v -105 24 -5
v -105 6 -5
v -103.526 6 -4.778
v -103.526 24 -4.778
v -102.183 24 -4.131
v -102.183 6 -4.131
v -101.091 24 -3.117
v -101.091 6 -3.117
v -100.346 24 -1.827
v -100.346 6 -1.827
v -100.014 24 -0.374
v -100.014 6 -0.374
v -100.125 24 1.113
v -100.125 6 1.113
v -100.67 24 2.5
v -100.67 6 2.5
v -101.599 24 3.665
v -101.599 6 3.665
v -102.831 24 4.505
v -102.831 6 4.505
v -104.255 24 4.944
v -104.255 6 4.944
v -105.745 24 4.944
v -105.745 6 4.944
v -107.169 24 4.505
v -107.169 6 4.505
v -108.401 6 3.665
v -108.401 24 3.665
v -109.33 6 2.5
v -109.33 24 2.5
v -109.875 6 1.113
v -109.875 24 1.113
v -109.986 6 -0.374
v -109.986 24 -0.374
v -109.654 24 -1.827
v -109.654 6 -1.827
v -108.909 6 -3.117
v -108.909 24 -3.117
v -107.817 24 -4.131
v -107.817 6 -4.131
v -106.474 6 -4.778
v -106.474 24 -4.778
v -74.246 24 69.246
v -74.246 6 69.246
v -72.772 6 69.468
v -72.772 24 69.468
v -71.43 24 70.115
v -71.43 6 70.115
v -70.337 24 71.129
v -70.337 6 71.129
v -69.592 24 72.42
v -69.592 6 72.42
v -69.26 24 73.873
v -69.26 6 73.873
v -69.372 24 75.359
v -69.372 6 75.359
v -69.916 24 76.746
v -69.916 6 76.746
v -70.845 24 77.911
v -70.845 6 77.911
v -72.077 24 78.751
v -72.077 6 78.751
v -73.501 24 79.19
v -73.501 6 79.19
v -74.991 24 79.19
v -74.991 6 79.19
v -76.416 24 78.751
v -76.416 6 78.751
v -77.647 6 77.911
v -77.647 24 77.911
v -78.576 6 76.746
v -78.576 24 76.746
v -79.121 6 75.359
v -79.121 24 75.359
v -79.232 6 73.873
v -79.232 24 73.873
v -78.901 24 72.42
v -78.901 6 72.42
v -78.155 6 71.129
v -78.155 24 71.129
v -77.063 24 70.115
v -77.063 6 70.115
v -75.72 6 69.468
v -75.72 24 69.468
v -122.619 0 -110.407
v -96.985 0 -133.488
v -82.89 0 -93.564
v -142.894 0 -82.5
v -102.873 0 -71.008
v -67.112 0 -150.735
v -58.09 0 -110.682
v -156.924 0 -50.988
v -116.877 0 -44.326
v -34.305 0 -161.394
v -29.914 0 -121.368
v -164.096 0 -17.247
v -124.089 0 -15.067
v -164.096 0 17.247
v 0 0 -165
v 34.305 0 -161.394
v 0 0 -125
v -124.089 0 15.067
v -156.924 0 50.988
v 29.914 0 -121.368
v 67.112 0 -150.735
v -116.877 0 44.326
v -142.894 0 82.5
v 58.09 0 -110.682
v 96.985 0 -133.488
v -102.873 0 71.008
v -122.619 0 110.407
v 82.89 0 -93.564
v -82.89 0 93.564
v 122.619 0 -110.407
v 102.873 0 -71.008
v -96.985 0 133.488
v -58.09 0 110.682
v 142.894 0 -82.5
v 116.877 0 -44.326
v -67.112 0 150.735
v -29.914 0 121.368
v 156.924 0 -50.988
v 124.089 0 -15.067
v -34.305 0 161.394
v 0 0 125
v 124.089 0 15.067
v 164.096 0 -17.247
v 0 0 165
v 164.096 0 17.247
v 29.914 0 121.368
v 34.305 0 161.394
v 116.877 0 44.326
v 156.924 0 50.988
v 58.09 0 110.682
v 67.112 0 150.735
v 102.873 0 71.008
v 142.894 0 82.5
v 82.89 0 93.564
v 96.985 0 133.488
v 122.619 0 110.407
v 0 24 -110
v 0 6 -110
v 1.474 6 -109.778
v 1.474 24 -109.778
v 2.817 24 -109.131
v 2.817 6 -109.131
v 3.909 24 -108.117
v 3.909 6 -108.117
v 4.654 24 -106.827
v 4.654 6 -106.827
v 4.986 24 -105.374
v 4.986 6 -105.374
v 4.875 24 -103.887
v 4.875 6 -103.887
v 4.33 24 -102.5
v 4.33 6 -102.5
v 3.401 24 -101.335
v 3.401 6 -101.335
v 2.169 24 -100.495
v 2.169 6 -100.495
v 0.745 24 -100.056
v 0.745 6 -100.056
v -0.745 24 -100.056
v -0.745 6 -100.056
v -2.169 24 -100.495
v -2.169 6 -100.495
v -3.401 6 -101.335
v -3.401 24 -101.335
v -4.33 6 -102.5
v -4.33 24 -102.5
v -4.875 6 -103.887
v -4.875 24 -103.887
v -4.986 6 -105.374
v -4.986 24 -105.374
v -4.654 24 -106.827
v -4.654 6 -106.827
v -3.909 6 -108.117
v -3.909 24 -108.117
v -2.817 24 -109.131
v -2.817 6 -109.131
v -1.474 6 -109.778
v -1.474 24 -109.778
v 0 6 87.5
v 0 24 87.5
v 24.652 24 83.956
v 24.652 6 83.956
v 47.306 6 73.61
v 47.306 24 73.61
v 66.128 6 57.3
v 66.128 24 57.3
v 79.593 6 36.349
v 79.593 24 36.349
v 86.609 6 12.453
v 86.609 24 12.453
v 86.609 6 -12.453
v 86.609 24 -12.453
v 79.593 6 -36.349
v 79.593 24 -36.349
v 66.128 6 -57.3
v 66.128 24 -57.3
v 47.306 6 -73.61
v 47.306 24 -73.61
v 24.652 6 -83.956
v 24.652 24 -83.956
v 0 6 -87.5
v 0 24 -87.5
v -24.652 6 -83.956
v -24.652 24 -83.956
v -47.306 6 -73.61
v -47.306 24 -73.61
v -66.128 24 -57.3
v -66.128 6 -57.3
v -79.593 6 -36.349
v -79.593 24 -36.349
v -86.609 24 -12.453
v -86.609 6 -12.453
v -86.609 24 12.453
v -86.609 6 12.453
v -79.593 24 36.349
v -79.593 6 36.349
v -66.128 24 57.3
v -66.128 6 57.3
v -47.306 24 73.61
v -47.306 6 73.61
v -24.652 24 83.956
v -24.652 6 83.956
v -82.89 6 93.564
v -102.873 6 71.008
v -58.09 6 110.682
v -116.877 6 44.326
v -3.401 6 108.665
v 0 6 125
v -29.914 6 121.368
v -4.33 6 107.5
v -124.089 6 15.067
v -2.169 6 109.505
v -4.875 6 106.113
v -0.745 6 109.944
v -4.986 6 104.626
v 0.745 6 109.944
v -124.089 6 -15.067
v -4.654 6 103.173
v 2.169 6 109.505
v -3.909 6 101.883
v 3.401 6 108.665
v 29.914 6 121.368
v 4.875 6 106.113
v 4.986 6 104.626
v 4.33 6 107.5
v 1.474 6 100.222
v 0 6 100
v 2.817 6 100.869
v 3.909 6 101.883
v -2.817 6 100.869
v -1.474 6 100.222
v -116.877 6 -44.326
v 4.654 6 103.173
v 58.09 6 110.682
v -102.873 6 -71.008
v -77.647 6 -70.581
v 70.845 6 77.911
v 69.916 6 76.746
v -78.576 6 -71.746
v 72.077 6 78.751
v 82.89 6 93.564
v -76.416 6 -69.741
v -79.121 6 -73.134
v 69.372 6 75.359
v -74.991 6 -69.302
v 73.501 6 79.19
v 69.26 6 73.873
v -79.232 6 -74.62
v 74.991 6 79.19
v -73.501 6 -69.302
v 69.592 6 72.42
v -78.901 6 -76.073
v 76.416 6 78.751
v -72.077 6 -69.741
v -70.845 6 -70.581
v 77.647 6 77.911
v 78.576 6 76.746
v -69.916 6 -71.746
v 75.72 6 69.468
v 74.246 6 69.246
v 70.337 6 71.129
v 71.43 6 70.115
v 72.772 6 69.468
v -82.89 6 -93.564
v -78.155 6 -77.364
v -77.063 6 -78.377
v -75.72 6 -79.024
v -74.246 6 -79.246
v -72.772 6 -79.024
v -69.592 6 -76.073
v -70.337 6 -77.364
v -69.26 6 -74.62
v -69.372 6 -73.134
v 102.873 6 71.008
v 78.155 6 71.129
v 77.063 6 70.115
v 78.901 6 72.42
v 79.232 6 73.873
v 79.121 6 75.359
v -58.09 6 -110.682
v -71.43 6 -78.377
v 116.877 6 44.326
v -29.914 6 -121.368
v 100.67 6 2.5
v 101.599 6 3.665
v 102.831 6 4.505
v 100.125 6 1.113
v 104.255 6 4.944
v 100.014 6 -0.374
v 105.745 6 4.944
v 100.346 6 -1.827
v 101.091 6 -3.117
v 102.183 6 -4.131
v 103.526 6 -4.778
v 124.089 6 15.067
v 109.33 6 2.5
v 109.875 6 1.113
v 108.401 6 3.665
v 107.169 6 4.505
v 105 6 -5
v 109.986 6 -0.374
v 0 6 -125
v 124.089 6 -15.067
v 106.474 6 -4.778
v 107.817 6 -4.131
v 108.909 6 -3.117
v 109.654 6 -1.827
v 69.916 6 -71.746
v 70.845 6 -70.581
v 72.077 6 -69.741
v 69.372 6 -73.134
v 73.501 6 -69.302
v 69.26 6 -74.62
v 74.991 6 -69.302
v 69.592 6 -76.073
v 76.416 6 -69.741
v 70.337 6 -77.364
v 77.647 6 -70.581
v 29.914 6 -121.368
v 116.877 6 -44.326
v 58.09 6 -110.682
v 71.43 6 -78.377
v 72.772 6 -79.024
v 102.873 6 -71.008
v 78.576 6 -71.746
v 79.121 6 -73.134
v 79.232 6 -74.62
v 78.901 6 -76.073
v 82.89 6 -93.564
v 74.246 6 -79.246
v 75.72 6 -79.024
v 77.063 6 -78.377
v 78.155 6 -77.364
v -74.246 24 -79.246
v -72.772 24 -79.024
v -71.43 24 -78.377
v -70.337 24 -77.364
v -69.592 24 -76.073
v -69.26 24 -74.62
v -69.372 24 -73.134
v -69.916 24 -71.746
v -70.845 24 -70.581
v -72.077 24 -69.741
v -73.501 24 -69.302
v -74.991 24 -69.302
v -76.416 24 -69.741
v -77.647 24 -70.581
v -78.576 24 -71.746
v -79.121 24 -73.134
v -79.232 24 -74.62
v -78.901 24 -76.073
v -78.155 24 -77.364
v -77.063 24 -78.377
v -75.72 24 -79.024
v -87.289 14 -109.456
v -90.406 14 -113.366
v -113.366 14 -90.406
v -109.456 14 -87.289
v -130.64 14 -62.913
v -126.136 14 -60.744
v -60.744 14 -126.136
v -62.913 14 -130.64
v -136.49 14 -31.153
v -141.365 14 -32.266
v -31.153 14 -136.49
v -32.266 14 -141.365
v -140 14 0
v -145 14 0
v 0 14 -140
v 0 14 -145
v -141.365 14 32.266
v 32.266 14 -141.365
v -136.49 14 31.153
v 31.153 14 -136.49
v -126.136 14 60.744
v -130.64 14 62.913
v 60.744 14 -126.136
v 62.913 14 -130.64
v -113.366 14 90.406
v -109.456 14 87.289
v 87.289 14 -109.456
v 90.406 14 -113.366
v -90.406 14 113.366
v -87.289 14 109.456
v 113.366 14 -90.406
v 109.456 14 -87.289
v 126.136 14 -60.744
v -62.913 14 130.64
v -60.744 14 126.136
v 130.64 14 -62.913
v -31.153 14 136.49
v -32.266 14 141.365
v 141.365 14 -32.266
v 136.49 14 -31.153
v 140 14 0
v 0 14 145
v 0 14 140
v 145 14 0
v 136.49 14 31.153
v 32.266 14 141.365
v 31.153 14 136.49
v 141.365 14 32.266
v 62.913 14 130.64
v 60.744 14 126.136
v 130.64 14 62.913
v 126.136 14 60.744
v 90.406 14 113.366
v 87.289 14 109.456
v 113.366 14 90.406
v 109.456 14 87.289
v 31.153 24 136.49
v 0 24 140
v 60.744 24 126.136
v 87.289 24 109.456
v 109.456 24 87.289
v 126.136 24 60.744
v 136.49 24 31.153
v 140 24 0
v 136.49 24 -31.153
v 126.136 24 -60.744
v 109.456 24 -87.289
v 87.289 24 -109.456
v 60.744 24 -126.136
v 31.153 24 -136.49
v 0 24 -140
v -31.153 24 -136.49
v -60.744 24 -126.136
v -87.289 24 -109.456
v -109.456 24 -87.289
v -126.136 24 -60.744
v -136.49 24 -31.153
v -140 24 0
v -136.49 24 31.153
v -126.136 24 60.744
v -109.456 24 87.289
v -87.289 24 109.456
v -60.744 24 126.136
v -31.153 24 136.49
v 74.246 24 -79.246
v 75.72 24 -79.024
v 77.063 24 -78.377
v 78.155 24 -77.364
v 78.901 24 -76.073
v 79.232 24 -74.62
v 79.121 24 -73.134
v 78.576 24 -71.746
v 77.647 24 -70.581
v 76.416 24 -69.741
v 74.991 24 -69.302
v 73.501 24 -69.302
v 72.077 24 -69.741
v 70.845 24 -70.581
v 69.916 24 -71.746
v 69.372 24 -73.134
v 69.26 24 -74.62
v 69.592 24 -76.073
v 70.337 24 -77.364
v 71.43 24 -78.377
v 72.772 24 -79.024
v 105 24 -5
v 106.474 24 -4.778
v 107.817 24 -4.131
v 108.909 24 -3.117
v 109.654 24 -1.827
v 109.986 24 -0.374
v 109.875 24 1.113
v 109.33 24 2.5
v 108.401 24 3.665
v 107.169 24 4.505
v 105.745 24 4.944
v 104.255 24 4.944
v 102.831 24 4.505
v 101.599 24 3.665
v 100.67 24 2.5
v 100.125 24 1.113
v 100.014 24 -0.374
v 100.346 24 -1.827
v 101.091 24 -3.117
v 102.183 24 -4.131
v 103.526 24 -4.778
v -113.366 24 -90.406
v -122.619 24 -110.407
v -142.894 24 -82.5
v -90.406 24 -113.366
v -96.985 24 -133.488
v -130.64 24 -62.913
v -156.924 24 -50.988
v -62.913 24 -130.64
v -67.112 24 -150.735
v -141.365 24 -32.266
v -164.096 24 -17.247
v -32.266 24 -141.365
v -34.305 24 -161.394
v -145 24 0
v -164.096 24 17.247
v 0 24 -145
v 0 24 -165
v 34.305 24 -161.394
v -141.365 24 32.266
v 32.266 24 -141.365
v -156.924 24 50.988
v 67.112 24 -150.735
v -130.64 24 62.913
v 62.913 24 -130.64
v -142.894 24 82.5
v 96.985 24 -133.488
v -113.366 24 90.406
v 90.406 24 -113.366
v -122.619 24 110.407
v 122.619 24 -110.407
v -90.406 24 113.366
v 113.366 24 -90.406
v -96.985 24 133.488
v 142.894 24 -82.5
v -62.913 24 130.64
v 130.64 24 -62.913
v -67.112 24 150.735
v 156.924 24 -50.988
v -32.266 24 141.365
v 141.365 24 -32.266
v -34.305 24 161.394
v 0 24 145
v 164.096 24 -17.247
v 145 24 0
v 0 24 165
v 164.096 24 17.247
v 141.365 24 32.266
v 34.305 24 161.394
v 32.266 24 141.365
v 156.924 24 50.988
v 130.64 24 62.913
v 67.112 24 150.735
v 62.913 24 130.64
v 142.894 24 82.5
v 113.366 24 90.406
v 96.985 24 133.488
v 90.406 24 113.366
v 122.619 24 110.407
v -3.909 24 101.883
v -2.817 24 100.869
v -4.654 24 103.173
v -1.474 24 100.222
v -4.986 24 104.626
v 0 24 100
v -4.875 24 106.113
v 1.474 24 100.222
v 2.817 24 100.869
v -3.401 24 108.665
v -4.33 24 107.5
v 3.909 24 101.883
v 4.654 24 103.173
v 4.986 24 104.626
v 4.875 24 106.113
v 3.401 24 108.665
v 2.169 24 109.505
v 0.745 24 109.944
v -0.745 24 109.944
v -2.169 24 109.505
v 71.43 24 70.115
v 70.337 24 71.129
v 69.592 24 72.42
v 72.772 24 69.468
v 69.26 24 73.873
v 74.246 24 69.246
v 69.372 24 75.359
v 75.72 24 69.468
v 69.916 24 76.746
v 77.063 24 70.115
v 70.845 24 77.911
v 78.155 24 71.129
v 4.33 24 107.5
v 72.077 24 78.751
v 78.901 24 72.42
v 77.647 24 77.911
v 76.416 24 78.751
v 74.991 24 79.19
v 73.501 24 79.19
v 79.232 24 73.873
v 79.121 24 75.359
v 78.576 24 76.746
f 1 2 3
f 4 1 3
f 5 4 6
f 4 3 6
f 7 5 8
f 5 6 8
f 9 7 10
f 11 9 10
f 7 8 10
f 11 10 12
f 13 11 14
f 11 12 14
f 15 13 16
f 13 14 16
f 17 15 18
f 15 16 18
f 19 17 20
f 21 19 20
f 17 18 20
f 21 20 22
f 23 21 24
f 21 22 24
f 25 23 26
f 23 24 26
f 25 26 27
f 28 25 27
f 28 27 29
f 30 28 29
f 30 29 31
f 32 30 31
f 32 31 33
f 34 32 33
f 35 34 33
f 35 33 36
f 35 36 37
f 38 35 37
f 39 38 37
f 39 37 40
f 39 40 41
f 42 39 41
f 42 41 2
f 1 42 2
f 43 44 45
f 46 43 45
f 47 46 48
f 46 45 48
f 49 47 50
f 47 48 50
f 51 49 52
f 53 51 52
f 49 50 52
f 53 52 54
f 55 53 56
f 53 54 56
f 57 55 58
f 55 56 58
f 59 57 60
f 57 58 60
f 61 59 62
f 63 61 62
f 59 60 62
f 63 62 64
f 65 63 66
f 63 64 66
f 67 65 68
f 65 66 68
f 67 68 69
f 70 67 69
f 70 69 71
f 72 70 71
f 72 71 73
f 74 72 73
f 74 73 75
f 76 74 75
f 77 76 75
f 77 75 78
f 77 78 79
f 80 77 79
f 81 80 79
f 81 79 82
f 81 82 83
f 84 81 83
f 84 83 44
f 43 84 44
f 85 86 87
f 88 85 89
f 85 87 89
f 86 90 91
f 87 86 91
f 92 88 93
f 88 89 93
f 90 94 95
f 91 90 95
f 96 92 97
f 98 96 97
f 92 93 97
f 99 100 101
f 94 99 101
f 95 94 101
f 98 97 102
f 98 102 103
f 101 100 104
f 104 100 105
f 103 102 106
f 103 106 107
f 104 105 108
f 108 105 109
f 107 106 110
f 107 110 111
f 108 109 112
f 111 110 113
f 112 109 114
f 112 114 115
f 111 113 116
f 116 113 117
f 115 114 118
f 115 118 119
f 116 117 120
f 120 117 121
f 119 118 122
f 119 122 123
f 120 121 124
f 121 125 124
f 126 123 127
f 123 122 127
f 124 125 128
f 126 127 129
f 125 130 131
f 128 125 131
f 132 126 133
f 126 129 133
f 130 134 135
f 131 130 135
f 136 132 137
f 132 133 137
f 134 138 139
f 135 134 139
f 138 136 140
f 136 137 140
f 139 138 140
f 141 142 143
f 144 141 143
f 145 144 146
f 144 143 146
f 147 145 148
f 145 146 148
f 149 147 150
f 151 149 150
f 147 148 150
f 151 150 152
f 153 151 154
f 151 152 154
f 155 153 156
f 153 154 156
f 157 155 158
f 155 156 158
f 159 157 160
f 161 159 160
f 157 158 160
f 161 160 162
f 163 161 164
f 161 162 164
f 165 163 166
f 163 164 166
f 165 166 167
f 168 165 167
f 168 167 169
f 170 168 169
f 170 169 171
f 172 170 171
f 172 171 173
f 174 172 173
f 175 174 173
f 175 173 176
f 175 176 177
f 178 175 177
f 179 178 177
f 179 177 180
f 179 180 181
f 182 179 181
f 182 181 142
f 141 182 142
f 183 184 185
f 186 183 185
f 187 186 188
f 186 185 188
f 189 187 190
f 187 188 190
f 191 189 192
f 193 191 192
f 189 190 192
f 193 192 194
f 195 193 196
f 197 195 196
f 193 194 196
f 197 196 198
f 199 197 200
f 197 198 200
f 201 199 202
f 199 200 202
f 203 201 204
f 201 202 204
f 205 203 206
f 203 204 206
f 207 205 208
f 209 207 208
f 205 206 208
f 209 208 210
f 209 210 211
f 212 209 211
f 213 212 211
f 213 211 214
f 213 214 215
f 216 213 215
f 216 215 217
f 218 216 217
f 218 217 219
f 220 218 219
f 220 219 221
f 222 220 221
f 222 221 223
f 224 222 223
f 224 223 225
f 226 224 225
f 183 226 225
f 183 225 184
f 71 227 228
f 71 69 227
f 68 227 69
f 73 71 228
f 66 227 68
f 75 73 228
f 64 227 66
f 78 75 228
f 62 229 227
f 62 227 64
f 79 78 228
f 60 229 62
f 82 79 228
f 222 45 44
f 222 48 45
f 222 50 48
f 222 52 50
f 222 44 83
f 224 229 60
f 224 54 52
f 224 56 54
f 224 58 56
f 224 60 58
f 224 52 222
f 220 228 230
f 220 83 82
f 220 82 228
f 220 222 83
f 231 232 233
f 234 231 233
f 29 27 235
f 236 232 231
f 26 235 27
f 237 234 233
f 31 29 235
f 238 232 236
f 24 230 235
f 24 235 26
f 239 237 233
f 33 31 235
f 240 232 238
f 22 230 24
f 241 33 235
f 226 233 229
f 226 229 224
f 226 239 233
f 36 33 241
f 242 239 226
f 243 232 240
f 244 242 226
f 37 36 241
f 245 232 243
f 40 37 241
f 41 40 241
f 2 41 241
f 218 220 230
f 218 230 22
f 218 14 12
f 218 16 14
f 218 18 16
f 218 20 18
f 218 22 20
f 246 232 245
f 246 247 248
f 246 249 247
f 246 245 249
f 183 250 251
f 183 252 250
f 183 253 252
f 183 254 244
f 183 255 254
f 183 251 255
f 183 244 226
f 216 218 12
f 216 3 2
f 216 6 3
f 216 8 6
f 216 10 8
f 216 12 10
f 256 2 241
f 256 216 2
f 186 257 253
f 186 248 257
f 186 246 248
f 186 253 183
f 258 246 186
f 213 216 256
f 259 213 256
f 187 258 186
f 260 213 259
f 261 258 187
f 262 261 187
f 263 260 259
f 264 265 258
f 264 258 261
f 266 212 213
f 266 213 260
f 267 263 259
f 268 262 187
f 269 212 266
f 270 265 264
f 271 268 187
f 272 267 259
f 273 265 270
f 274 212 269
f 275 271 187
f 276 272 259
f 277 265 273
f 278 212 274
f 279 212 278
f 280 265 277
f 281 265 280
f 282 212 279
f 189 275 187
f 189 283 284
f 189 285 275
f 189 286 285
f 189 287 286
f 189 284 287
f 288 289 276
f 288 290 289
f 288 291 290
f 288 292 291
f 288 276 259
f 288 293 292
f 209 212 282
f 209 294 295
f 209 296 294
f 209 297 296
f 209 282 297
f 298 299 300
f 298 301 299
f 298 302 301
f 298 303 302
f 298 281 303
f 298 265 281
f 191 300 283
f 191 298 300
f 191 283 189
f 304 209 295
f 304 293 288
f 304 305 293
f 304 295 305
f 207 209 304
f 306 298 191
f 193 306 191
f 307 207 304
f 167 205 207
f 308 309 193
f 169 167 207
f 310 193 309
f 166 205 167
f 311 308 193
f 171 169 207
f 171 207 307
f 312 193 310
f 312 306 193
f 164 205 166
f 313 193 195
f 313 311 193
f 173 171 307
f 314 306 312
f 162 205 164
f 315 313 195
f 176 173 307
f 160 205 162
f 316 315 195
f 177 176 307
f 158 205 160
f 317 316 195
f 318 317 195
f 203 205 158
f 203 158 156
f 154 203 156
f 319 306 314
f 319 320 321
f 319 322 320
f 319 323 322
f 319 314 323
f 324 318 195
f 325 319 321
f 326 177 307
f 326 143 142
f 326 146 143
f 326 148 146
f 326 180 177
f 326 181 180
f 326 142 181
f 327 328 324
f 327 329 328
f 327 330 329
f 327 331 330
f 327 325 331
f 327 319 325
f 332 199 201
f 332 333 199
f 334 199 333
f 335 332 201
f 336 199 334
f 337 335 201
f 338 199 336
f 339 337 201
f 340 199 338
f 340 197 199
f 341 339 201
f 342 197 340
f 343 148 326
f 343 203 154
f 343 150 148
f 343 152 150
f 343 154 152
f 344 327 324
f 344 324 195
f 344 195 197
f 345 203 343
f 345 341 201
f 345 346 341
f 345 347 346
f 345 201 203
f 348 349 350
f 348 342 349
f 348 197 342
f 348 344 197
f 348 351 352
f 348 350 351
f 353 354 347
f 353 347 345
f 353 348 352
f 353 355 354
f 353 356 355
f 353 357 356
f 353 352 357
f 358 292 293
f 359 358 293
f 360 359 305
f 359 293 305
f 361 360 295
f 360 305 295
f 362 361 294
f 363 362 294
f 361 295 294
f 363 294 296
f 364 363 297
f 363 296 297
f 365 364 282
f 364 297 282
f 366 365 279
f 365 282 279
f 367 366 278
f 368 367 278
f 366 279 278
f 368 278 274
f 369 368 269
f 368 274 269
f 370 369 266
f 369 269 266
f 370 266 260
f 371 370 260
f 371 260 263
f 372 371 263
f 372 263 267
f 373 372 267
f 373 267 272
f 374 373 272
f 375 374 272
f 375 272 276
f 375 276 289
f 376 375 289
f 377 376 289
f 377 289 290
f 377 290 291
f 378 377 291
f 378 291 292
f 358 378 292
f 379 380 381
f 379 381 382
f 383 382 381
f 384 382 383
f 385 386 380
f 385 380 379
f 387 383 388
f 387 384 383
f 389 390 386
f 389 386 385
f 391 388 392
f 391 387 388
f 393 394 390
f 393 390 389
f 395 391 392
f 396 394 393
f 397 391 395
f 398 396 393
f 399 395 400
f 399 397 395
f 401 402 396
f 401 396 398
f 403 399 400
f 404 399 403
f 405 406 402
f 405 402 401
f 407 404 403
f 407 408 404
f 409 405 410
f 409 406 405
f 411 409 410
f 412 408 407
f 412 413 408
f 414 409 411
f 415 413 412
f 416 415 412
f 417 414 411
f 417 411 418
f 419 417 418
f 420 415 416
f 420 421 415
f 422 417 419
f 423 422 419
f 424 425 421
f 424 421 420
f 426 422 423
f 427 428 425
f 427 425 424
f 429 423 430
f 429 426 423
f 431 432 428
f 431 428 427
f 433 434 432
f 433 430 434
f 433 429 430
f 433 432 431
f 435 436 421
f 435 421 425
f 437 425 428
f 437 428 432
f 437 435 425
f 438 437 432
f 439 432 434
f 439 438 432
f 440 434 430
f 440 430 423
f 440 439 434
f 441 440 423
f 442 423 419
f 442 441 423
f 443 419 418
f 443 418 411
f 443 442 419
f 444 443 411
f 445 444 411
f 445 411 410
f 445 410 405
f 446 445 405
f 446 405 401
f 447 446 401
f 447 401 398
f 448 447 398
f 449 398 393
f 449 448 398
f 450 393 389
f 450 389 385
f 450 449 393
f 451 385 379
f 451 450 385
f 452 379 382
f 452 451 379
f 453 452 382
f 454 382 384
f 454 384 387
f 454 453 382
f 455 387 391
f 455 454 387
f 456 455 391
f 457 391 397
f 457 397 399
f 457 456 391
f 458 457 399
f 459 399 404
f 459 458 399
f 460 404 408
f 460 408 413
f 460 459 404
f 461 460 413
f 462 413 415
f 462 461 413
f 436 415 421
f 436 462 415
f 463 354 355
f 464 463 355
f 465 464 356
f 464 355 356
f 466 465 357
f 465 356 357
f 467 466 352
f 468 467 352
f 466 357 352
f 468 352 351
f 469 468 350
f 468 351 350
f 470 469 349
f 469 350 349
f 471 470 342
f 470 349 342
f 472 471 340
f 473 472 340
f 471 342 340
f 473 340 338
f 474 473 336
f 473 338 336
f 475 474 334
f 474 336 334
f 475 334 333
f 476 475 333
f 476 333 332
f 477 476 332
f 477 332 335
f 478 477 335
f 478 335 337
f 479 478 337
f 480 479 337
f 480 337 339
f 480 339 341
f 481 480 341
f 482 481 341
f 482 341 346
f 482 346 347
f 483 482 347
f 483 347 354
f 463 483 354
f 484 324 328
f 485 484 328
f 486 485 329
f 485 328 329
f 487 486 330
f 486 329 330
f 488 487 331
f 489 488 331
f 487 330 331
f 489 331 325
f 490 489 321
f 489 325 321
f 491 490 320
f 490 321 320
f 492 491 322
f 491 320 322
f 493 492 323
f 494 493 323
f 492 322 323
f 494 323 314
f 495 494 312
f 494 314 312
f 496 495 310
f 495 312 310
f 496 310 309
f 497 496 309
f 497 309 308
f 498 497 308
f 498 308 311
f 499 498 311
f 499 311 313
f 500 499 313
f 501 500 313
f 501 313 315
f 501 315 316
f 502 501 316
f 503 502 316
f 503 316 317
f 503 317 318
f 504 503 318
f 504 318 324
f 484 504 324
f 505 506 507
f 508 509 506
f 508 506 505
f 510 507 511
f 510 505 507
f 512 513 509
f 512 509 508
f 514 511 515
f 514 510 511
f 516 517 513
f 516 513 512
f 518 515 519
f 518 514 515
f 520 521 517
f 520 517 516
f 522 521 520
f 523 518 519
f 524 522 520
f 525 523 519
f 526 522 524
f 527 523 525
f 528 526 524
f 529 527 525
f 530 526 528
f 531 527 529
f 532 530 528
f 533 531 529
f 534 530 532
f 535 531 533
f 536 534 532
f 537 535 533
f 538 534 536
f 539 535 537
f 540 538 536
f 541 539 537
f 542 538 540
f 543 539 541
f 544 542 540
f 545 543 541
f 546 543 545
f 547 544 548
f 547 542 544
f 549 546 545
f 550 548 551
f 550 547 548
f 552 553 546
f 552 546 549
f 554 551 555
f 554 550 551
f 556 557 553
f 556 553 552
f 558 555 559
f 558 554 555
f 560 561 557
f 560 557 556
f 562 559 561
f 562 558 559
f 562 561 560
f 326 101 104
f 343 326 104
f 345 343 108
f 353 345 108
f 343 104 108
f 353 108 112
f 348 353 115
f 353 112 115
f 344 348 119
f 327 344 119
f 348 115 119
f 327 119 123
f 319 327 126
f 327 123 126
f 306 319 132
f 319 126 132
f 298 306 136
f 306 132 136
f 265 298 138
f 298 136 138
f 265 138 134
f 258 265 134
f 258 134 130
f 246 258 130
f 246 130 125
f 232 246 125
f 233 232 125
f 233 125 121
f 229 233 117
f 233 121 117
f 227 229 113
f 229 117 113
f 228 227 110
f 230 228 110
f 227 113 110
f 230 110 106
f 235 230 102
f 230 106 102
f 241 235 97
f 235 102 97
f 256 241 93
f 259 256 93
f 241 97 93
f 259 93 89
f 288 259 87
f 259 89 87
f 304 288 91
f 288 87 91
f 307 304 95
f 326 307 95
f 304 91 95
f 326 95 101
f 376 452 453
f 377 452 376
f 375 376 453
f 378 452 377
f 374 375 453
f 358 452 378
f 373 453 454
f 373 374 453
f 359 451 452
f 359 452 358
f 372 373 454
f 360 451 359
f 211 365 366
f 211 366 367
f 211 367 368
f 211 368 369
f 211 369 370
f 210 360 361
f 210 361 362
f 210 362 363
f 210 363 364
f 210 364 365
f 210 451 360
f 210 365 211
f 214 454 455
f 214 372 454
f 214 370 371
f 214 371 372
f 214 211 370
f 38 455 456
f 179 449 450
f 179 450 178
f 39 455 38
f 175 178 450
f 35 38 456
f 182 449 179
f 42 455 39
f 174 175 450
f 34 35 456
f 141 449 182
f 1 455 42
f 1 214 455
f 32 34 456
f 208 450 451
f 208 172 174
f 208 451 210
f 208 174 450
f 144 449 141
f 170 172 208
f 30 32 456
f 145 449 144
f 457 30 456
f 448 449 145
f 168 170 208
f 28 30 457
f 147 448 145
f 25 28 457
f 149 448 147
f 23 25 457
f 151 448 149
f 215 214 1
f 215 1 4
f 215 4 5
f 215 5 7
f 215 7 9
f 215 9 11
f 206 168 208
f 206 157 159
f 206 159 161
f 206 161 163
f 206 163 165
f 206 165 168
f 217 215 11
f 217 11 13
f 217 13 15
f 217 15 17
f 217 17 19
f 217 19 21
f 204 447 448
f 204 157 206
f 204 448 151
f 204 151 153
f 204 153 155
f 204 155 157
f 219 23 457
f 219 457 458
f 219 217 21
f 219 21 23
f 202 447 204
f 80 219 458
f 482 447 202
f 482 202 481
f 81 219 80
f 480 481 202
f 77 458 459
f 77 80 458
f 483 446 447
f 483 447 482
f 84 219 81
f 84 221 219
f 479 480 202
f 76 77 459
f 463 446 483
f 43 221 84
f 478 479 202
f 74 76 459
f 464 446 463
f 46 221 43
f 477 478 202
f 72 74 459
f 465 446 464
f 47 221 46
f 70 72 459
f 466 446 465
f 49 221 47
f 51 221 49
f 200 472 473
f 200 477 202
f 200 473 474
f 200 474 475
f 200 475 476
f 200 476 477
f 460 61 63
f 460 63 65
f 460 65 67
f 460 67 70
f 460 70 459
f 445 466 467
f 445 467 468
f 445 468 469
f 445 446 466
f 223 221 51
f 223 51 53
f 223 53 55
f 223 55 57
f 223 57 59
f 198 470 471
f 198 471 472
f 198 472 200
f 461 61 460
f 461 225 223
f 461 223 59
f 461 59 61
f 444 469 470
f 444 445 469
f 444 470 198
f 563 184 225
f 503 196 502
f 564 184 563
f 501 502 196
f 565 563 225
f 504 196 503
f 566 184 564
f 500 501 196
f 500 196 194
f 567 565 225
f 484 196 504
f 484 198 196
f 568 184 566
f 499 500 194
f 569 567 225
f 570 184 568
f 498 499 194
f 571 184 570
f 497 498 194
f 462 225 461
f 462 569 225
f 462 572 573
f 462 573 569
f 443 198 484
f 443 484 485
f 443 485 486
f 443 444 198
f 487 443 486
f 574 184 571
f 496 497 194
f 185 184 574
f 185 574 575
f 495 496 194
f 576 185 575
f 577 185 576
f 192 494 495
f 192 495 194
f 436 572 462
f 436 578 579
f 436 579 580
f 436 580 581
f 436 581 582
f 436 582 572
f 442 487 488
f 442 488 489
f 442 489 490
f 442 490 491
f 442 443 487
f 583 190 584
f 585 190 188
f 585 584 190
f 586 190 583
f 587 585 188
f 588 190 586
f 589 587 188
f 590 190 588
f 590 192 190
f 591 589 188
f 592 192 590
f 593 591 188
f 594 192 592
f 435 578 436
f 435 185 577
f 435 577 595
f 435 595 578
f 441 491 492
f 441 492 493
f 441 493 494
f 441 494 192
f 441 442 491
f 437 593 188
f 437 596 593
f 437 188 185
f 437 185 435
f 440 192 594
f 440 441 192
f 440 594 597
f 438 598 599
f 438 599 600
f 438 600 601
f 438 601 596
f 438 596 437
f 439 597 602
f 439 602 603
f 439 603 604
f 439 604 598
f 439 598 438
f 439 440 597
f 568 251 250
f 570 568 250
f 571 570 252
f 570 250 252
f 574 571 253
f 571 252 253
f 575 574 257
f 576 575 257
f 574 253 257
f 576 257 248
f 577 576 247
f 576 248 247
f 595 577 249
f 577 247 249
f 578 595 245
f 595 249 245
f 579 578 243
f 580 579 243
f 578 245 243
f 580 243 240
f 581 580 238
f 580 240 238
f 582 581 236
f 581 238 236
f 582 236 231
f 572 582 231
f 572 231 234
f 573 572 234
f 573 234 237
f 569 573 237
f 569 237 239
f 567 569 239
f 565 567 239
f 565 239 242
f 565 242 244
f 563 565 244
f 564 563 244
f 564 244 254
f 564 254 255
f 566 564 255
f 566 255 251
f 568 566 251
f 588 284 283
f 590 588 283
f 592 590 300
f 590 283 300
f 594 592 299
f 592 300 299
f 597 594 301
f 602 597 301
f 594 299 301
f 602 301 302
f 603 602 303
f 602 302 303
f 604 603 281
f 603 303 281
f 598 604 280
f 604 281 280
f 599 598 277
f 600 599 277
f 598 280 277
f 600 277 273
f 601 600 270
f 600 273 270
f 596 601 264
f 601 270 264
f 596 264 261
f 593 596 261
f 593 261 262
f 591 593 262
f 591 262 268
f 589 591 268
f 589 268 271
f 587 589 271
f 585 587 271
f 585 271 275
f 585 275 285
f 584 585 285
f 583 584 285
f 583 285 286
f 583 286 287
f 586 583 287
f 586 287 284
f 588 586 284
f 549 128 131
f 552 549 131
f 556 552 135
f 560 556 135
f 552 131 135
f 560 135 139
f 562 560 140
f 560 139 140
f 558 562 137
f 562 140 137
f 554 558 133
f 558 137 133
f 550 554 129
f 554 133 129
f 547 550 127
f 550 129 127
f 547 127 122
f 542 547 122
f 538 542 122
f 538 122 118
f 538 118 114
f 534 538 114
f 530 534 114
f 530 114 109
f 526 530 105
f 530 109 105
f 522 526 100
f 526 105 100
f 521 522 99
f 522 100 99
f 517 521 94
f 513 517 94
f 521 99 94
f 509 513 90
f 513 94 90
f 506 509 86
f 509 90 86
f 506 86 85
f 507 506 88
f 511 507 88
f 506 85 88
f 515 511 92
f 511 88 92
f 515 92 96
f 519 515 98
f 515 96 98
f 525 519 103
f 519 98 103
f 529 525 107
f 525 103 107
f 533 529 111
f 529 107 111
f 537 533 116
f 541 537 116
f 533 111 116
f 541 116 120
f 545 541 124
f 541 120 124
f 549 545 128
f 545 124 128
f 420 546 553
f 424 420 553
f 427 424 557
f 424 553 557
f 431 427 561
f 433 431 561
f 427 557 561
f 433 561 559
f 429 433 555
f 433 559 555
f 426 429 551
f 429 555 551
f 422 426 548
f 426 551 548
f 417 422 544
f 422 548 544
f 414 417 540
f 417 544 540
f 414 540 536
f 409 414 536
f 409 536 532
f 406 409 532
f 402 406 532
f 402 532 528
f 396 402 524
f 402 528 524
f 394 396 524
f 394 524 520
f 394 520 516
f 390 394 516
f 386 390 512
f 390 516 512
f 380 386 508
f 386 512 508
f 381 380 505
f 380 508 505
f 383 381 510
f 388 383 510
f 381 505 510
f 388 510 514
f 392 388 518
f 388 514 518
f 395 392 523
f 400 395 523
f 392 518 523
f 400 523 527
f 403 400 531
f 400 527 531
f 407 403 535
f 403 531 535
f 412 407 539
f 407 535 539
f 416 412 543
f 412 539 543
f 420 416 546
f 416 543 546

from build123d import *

# Parameters (mm, degrees)
SKETCH1_R          = 165
PLATE_DEPTH        = 24
SKETCH2_R          = 87.5
BEARING_HOLE_DEPTH = 235.576213628
SKETCH4_R          = 145
SKETCH4_R_2        = 140
CUT_EXTRUDE3_DEPTH = 10
SKETCH5_R          = 125
CUT_EXTRUDE4_DEPTH = 6
SKETCH6_R          = 5
CUT_EXTRUDE5_DEPTH = 235.038458378


with BuildPart() as part:
    # Sketch1 → plate (new body)
    with BuildSketch(Plane(origin=(0, 0, 0), x_dir=(1, 0, 0), z_dir=(0, 1, 0))):
        with Locations(Location((0, 0, 0), (0, 0, 270))):
            Circle(SKETCH1_R)
    extrude(amount=PLATE_DEPTH)

    # Sketch2 → bearing-hole (cut, through all)
    with BuildSketch(Plane(origin=(0, 24, 0), x_dir=(1, 0, 0), z_dir=(0, 1, 0))):
        with Locations(Location((0, 0, 0), (0, 0, 270))):
            Circle(SKETCH2_R)
    extrude(amount=-BEARING_HOLE_DEPTH, mode=Mode.SUBTRACT)

    # Sketch4 → Cut-Extrude3 (cut)
    with BuildSketch(Plane(origin=(0, 24, 0), x_dir=(1, 0, 0), z_dir=(0, 1, 0))):
        with Locations(Location((0, 0, 0), (0, 0, 270))):
            Circle(SKETCH4_R)
        with Locations(Location((0, 0, 0), (0, 0, 270))):
            Circle(SKETCH4_R_2, mode=Mode.SUBTRACT)
    extrude(amount=-CUT_EXTRUDE3_DEPTH, mode=Mode.SUBTRACT)

    # Sketch5 → Cut-Extrude4 (cut)
    with BuildSketch(Plane.XZ):
        with Locations(Location((0, 0, 0), (0, 0, 270))):
            Circle(SKETCH5_R)
    extrude(amount=-CUT_EXTRUDE4_DEPTH, mode=Mode.SUBTRACT)

    # Sketch6 → Cut-Extrude5 (cut, through all)
    with BuildSketch(Plane.XZ.offset(-6)):
        with Locations(Location((0, 105, 0), (0, 0, 270))):
            Circle(SKETCH6_R)
        with Locations(Location((74.246212025, 74.246212025, 0), (0, 0, 270))):
            Circle(SKETCH6_R)
        with Locations(Location((105, 0, 0), (0, 0, 270))):
            Circle(SKETCH6_R)
        with Locations(Location((74.246212025, -74.246212025, 0), (0, 0, 270))):
            Circle(SKETCH6_R)
        with Locations(Location((0, -105, 0), (0, 0, 270))):
            Circle(SKETCH6_R)
        with Locations(Location((-74.246212025, -74.246212025, 0), (0, 0, 270))):
            Circle(SKETCH6_R)
        with Locations(Location((-105, 0, 0), (0, 0, 270))):
            Circle(SKETCH6_R)
        with Locations(Location((-74.246212025, 74.246212025, 0), (0, 0, 270))):
            Circle(SKETCH6_R)
    extrude(amount=-CUT_EXTRUDE5_DEPTH, mode=Mode.SUBTRACT)


solid = part.part
